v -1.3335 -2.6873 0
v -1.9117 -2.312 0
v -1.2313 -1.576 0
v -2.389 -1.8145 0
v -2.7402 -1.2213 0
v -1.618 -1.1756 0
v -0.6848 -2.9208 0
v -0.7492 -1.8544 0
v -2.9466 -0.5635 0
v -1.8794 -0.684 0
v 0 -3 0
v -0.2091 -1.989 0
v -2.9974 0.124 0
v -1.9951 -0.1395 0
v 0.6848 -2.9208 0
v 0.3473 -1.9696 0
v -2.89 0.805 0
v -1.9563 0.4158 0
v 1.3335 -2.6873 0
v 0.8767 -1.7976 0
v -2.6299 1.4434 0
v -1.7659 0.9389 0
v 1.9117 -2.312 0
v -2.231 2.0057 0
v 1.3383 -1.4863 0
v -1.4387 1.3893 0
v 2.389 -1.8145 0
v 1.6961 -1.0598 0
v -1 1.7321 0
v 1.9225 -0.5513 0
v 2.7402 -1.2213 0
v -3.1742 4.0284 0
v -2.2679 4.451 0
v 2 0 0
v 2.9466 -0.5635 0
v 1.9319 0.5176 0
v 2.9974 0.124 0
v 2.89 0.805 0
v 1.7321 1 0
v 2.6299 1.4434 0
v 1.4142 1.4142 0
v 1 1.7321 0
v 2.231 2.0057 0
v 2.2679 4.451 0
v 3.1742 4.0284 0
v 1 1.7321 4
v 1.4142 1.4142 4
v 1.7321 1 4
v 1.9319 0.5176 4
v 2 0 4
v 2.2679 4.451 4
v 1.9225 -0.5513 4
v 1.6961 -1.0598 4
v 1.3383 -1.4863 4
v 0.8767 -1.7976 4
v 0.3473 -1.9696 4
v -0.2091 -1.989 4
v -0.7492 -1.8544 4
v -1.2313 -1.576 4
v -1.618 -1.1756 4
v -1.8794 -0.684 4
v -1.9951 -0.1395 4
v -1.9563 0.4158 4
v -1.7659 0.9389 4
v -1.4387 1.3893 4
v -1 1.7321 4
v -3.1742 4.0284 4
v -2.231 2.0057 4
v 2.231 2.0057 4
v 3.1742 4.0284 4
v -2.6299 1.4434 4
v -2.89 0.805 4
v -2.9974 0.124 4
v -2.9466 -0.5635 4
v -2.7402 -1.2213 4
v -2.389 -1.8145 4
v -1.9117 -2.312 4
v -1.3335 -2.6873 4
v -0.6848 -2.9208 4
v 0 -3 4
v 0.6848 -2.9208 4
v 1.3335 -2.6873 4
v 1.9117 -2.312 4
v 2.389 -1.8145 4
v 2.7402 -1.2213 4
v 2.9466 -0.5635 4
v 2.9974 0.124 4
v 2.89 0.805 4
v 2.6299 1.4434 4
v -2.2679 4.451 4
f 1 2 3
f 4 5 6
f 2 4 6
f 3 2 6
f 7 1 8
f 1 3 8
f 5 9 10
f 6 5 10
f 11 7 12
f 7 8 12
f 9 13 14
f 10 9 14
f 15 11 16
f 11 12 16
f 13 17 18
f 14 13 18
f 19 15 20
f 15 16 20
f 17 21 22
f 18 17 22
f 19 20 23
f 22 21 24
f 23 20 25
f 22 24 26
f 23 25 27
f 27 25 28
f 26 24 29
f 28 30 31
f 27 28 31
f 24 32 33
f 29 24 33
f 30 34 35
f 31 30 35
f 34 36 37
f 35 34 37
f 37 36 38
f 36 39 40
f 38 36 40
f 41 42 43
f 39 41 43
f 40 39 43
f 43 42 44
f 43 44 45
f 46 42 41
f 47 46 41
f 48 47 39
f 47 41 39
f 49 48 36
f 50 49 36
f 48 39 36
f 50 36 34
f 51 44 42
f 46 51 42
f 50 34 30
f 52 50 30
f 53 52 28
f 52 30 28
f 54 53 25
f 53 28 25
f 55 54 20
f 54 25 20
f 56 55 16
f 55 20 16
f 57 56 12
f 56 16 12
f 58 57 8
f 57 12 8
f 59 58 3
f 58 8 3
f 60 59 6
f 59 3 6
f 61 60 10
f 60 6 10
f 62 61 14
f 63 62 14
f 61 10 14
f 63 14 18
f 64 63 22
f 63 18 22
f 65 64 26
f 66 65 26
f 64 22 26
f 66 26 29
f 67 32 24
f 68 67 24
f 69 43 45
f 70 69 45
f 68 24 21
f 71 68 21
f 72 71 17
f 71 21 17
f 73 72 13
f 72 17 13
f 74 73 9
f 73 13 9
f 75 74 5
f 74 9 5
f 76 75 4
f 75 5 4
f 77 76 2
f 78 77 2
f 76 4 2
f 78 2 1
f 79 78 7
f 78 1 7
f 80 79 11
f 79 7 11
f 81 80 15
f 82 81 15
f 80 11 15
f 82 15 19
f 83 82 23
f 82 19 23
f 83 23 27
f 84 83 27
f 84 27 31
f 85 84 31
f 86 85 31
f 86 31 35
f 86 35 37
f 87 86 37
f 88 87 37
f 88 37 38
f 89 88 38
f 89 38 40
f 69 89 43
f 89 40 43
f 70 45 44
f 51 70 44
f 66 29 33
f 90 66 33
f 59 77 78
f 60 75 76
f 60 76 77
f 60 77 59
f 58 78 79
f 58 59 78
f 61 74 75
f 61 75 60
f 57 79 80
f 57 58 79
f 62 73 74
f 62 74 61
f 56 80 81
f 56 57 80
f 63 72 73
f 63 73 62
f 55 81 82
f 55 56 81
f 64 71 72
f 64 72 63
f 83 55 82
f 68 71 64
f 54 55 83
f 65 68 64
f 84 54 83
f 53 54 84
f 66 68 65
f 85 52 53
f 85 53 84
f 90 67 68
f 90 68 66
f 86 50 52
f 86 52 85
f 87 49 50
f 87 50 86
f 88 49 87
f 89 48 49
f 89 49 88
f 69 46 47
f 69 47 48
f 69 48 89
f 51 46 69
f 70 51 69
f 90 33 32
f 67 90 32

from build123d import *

# Parameters (mm, degrees)
F1_DEPTH = 4


with BuildPart() as f1:
    # F0 (on Top) → F1 (new body)
    with BuildSketch(Plane.XY):
        with BuildLine():
            ThreePointArc((1, 1.732051), (1.732051, 1), (2, 0))
            ThreePointArc((2, 0), (-1, -1.732051), (-1, 1.732051))
            Line((-1, 1.732051), (-2.267855, 4.450974))
            Line((-2.267855, 4.450974), (-3.174163, 4.028356))
            Line((-3.174163, 4.028356), (-2.230974, 2.005681))
            ThreePointArc((-2.230974, 2.005681), (0, -3), (2.230974, 2.005681))
            Line((2.230974, 2.005681), (3.174163, 4.028356))
            Line((3.174163, 4.028356), (2.267855, 4.450974))
            Line((2.267855, 4.450974), (1, 1.732051))
        make_face()
    extrude(amount=F1_DEPTH)


solid = f1.part
